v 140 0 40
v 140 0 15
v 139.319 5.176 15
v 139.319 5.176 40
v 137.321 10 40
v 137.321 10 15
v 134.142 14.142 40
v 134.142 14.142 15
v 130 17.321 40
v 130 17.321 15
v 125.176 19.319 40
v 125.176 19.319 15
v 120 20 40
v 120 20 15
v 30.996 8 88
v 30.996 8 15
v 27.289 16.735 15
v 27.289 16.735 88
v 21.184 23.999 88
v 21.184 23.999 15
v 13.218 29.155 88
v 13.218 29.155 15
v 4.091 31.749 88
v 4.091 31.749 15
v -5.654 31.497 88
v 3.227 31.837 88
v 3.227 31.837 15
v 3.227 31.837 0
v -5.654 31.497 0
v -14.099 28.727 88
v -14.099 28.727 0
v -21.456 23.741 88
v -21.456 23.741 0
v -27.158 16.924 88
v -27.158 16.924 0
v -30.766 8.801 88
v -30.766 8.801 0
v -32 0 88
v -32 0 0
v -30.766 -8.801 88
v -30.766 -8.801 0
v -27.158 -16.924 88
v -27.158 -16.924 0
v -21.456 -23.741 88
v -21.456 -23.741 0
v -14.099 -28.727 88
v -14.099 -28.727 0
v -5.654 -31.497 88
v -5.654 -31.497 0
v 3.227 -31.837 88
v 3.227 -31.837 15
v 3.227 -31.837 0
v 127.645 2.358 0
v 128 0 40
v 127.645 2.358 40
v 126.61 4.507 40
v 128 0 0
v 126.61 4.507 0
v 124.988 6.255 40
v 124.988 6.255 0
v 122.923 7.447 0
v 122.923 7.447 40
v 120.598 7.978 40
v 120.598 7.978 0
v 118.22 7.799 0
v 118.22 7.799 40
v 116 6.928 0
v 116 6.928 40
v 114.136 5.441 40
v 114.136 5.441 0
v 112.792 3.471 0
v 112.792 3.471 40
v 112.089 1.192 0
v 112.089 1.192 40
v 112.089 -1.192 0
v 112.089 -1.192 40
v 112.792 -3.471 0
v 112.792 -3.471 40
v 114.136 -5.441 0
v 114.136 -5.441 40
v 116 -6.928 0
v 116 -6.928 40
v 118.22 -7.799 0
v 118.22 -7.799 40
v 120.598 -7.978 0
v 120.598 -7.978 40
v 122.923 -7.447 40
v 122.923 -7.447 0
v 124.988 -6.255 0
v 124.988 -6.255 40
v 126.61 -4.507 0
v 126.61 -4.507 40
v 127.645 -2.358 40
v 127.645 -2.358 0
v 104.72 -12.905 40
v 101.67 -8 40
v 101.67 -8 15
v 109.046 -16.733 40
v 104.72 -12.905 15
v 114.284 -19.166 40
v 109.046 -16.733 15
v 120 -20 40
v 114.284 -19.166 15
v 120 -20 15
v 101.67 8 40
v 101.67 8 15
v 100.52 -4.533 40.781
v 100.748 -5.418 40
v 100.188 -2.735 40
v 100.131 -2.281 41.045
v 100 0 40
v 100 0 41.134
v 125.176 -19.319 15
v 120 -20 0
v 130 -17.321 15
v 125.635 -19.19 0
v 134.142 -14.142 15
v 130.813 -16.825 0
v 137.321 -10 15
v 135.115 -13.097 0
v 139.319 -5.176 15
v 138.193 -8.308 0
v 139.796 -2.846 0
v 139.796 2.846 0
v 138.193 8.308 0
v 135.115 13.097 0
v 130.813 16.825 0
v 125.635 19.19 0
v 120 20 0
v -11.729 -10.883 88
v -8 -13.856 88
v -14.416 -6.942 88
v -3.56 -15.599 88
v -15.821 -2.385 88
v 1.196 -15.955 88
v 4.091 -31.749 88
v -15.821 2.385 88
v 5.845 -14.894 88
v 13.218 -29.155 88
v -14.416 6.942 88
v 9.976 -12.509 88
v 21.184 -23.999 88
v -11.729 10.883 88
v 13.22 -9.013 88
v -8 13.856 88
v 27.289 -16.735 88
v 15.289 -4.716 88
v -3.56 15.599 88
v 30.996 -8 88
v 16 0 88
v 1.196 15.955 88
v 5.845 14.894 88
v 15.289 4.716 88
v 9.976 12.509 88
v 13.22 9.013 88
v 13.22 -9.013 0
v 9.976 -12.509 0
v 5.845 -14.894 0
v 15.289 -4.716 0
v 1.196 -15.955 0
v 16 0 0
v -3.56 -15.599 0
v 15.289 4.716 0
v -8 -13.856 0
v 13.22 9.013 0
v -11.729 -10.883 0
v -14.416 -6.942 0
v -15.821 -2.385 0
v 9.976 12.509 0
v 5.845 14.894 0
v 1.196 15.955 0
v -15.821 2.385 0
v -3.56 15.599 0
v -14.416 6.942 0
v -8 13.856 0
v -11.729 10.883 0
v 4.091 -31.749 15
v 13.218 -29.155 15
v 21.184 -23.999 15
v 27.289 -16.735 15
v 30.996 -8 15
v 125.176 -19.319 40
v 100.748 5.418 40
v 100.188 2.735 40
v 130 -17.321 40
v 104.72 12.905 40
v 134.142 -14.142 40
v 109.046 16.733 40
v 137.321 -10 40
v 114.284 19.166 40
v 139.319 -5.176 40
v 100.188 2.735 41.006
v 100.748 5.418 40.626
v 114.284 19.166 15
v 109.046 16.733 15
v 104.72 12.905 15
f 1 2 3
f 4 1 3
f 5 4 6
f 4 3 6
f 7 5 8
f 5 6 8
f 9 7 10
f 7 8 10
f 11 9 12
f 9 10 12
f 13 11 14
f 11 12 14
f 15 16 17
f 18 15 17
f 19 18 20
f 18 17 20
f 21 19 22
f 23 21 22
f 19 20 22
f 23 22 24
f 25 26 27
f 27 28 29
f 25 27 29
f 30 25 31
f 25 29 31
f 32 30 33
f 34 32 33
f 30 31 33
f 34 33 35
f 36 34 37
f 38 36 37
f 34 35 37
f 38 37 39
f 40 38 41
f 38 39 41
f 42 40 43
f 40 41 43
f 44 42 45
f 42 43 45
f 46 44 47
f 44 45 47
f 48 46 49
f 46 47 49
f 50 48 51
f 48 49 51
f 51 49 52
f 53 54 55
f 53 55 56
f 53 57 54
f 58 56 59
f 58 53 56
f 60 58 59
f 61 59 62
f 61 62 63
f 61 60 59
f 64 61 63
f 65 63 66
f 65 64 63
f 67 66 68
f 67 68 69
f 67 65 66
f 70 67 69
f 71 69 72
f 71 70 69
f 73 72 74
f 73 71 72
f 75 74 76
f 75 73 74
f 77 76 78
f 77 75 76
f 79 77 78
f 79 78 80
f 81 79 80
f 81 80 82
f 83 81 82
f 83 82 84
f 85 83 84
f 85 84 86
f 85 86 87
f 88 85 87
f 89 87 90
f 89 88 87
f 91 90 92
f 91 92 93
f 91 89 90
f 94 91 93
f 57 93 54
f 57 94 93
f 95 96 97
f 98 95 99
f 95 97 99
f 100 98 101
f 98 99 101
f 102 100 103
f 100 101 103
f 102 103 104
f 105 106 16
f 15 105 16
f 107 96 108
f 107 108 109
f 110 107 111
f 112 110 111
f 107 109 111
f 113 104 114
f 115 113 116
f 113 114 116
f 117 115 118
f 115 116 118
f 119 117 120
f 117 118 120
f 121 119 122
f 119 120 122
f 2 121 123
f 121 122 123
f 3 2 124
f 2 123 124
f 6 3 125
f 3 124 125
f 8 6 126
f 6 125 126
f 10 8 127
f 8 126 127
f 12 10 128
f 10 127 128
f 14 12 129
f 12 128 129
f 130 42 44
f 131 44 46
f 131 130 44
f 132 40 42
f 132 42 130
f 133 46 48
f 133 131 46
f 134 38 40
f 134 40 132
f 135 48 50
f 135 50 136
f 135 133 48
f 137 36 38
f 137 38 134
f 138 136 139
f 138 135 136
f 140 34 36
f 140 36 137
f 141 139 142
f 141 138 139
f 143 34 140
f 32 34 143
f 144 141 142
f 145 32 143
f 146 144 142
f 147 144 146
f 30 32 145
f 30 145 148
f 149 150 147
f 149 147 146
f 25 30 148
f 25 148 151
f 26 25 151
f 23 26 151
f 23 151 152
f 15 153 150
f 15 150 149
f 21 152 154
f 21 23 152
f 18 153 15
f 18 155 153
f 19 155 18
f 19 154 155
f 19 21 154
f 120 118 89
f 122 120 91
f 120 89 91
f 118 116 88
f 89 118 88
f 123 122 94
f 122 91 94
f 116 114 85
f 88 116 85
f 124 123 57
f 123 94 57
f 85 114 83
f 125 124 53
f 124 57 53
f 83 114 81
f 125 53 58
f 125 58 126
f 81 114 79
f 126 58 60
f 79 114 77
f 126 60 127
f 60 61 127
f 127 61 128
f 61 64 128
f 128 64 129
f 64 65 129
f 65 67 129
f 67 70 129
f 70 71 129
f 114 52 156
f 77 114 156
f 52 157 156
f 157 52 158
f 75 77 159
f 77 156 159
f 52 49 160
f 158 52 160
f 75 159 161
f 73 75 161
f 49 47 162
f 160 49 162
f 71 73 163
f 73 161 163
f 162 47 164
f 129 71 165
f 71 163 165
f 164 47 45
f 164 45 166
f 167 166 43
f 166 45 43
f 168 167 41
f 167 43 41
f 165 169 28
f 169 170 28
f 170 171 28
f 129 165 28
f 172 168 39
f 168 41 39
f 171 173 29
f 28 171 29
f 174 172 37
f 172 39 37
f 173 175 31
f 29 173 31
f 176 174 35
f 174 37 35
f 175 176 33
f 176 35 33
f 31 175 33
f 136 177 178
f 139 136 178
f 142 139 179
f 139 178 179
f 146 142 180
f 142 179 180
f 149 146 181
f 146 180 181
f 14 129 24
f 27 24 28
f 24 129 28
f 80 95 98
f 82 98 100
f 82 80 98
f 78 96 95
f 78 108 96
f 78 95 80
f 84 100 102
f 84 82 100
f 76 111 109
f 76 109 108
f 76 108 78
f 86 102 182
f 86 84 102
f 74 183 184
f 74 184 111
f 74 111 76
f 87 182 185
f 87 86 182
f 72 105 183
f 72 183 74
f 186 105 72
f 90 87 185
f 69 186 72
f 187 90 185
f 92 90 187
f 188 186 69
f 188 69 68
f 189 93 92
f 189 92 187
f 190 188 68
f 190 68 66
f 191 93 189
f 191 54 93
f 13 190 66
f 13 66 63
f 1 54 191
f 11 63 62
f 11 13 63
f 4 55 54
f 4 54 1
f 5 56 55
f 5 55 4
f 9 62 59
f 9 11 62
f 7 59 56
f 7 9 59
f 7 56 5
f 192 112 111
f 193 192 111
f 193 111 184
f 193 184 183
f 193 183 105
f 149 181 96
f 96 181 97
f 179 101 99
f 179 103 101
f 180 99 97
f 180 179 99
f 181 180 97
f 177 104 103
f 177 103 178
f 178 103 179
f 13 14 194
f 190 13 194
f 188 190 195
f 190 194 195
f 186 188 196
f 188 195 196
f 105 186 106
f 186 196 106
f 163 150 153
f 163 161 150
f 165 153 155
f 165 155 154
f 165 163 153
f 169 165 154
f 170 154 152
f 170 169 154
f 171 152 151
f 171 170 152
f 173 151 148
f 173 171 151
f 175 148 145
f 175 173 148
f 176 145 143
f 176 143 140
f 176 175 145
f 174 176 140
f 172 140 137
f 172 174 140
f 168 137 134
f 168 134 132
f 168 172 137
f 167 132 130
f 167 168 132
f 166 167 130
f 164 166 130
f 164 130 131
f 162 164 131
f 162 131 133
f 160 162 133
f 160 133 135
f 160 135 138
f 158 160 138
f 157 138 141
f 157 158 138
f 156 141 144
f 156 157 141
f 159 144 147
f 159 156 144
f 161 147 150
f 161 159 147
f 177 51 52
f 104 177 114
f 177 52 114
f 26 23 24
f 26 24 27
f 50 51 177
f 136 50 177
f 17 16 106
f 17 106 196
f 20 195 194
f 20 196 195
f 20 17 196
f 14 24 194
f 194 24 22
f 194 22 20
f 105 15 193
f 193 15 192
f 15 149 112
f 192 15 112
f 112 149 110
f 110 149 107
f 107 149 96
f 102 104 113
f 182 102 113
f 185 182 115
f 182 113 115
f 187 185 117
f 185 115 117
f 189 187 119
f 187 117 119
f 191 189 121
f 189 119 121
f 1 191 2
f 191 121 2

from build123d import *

# Parameters (mm, degrees)
SKETCH1_R           = 16
SKETCH1_R_2         = 8
BOSS_EXTRUDE1_DEPTH = 15
SKETCH2_R           = 16
BOSS_EXTRUDE2_DEPTH = 73
SKETCH2_3_R         = 8
BOSS_EXTRUDE3_DEPTH = 25
BOSS_EXTRUDE7_DEPTH = 73
CUT_EXTRUDE1_DEPTH  = 73


with BuildPart() as part:
    # Sketch1 → Boss-Extrude1 (new body)
    with BuildSketch(Plane(origin=(0, 0, 0), x_dir=(0, 1, 0), z_dir=(0, 0, 1))):
        with BuildLine():
            Line((-31.836853451, -3.227191092), (-20, -120))
            ThreePointArc((-20, -120), (0, -140), (20, -120))
            Line((20, -120), (31.836853451, -3.227191092))
            ThreePointArc((31.836853451, -3.227191092), (0, 32), (-31.836853451, -3.227191092))
        make_face()
        with Locations(Location((0, 0, 0), (0, 0, 270))):
            Circle(SKETCH1_R, mode=Mode.SUBTRACT)
        with Locations(Location((0, -120, 0), (0, 0, 270))):
            Circle(SKETCH1_R_2, mode=Mode.SUBTRACT)
    extrude(amount=BOSS_EXTRUDE1_DEPTH)

    # Sketch2 → Boss-Extrude2 (add)
    with BuildSketch(Plane.XY.offset(15)):
        with BuildLine():
            ThreePointArc((4.090932126, -31.749299027), (24.038632569, -21.139958812), (32.01177462, 0))
            ThreePointArc((32.01177462, 0), (24.038632569, 21.139958812), (4.090932126, 31.749299027))
            Line((4.090932126, 31.749299027), (3.227191092, 31.836853451))
            ThreePointArc((3.227191092, 31.836853451), (-32, 0), (3.227191092, -31.836853451))
            Line((3.227191092, -31.836853451), (4.090932126, -31.749299027))
        make_face()
        Circle(SKETCH2_R, mode=Mode.SUBTRACT)
    extrude(amount=BOSS_EXTRUDE2_DEPTH)

    # Sketch2<3> → Boss-Extrude3 (add)
    with BuildSketch(Plane.XY.offset(15)):
        with BuildLine():
            ThreePointArc((120, -20), (134.142135624, -14.142135624), (140, 0))
            ThreePointArc((140, 0), (134.142135624, 14.142135624), (120, 20))
            ThreePointArc((120, 20), (100, 0), (120, -20))
        make_face()
        with Locations((120, 0)):
            Circle(SKETCH2_3_R, mode=Mode.SUBTRACT)
    extrude(amount=BOSS_EXTRUDE3_DEPTH)

    # Sketch5 → Boss-Extrude7 (add)
    with BuildSketch(Plane.XY.offset(15)):
        with BuildLine():
            ThreePointArc((30.996027396, 8), (31.756822554, 4.032113045), (32.01177462, 0))
            Line((32.01177462, 0), (100, 0))
            ThreePointArc((100, 0), (100.421873741, 4.086192874), (101.66969722, 8))
            Line((101.66969722, 8), (30.996027396, 8))
        make_face()
        with BuildLine():
            Line((100, 0), (32.01177462, 0))
            ThreePointArc((32.01177462, 0), (31.756822554, -4.032113045), (30.996027396, -8))
            Line((30.996027396, -8), (101.66969722, -8))
            ThreePointArc((101.66969722, -8), (100.421873741, -4.086192874), (100, 0))
        make_face()
    extrude(amount=BOSS_EXTRUDE7_DEPTH)

    # Sketch6 → Cut-Extrude1 (cut)
    with BuildSketch(Plane.XZ.offset(8)):
        Polygon((30.996027396, 88), (101.66969722, 40), (101.66969722, 88), align=None)
    extrude(amount=-CUT_EXTRUDE1_DEPTH, mode=Mode.SUBTRACT)


solid = part.part
